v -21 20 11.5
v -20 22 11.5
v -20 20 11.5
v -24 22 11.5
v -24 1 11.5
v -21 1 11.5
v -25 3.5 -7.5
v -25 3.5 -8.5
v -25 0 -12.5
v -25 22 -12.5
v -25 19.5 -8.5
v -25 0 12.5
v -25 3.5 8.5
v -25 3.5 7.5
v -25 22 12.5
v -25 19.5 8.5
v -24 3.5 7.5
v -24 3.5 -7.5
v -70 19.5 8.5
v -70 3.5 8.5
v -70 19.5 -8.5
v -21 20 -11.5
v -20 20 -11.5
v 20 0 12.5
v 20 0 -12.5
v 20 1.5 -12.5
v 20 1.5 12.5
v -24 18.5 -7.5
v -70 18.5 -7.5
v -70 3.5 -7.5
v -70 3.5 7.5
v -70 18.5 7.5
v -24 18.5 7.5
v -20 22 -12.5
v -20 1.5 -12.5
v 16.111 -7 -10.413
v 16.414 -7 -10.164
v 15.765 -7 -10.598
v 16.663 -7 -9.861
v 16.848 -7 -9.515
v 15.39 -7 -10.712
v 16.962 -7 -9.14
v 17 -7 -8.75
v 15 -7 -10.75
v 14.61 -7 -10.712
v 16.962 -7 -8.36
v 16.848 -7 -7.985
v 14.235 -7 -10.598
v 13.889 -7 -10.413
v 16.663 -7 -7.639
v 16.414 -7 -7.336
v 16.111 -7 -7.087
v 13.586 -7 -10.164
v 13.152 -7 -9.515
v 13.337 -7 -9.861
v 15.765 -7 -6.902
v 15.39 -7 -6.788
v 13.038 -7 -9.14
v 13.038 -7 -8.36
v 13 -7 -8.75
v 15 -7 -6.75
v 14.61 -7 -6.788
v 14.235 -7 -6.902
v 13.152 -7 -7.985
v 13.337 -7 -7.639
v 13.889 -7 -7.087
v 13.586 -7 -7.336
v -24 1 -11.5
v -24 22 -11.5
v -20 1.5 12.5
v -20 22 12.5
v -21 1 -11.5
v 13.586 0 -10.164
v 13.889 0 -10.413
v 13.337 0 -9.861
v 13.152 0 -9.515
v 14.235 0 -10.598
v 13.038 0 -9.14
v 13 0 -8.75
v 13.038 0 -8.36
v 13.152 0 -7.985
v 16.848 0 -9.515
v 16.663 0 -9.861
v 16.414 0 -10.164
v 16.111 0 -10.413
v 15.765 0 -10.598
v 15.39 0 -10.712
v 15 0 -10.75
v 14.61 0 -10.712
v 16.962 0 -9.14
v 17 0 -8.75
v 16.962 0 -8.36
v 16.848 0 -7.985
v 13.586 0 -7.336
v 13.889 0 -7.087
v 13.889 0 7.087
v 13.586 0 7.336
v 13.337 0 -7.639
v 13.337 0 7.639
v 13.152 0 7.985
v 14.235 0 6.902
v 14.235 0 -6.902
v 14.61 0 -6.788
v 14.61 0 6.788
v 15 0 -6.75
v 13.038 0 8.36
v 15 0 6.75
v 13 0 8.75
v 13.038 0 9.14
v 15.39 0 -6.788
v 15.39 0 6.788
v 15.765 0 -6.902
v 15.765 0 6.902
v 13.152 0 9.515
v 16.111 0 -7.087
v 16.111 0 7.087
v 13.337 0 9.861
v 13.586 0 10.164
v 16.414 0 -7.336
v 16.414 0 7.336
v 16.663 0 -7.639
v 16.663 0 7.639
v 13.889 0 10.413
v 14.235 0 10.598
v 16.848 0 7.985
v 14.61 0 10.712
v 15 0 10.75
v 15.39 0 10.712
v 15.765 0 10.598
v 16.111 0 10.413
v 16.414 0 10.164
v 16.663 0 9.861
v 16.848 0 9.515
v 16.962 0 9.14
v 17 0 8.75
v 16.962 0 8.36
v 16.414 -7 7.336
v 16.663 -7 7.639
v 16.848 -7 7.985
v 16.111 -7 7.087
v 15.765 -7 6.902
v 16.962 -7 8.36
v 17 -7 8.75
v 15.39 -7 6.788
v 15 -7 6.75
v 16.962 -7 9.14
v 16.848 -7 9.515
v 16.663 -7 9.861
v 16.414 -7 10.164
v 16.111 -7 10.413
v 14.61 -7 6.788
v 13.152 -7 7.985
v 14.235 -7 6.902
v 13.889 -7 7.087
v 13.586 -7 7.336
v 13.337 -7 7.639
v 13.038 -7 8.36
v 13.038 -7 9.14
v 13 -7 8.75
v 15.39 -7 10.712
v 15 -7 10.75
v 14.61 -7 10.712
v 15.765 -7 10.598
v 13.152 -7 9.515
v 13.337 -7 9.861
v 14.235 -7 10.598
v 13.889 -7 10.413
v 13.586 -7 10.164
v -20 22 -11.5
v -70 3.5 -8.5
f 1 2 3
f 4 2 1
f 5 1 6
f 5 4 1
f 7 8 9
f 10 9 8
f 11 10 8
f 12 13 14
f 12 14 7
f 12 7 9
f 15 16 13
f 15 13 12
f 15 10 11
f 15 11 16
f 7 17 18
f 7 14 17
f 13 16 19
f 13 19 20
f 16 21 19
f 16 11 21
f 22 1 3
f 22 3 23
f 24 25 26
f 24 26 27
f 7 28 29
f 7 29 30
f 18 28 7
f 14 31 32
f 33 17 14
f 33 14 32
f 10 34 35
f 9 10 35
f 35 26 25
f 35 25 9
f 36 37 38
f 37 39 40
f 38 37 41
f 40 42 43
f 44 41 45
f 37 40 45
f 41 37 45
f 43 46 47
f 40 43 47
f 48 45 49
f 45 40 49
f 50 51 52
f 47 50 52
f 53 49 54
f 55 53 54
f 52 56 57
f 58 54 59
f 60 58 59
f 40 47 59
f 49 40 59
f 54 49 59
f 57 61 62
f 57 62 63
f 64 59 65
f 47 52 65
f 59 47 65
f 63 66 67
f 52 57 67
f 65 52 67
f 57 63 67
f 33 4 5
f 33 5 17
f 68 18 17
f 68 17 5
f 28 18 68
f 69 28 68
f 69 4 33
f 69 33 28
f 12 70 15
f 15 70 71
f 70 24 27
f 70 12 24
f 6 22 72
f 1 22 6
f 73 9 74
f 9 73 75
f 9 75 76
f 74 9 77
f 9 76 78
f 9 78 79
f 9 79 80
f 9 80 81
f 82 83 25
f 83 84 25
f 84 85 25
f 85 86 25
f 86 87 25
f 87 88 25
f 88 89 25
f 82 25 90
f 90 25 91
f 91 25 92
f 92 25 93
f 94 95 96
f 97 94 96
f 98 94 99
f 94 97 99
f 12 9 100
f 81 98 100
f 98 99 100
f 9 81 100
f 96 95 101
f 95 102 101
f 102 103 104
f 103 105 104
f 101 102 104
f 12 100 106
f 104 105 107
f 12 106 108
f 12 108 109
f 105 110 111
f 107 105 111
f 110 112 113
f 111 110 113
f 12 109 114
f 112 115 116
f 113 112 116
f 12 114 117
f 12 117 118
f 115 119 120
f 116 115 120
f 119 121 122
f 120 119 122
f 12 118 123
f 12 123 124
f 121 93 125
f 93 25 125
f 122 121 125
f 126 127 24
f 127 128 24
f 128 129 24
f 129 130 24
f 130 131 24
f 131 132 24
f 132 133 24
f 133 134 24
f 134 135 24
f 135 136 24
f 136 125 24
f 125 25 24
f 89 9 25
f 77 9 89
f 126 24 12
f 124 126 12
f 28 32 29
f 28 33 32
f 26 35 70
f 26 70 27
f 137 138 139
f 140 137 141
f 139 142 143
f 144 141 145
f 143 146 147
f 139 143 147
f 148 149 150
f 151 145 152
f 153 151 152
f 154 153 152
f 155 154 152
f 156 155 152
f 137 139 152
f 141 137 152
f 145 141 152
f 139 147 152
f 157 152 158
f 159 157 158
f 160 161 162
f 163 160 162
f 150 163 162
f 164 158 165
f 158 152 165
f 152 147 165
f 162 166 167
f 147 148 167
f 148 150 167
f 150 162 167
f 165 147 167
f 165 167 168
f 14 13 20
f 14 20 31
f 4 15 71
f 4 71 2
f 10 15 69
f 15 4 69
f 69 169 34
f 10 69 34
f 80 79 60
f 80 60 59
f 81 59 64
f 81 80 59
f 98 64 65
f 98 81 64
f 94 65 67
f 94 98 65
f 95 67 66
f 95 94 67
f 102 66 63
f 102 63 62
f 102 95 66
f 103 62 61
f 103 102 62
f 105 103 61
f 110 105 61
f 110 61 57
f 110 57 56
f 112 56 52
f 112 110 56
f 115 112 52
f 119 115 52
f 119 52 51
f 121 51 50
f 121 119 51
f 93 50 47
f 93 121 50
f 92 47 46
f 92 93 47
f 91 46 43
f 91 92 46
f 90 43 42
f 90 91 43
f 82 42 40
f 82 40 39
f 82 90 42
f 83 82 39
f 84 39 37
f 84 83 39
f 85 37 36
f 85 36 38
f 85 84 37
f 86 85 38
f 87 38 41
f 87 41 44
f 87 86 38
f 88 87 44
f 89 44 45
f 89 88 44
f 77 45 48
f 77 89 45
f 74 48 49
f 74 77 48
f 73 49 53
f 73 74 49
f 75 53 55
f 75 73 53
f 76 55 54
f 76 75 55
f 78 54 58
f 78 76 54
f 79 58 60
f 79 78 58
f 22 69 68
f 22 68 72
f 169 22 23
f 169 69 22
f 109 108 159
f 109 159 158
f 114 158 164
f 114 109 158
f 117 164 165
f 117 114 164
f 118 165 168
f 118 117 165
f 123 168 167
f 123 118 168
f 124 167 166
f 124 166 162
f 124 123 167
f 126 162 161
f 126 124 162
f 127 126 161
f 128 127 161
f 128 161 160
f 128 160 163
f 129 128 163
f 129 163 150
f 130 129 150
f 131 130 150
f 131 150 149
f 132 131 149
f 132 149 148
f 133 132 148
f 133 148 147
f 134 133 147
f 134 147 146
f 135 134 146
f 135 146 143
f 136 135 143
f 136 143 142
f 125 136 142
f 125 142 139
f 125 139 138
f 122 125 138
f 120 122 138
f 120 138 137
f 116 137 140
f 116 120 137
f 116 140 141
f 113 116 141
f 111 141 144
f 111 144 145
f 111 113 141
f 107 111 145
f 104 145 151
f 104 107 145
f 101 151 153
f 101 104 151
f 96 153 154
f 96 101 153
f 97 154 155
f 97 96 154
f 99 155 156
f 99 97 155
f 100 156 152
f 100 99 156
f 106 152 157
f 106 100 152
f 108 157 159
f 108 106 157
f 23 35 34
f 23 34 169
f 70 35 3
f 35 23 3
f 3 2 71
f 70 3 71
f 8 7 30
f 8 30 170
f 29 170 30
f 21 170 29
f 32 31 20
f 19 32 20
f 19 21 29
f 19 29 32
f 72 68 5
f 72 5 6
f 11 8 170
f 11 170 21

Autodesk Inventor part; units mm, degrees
ref_plane "YZ Plane" through (0, 0, 0) normal (1, 0, 0) x (0, 1, 0)
ref_plane "XZ Plane" through (0, 0, 0) normal (0, 1, 0) x (-1, 0, 0)
ref_plane "XY Plane" through (0, 0, 0) normal (0, 0, 1) x (1, 0, 0)
sketch "Sketch1" plane through (0, 0, 0) normal (0, 1, 0) x (-1, 0, 0)
  line L0 (-20, 12.5) -> (20, 12.5)
  line L1 (20, 12.5) -> (20, -12.5)
  line L2 (20, -12.5) -> (-20, -12.5)
  line L3 (-20, -12.5) -> (-20, 12.5)
  line L4 (-20, 12.5) -> (20, -12.5) construction
  line L5 (20, 12.5) -> (-20, -12.5) construction
  circle A0 centre (-15, 8.75) radius 2
  circle A1 centre (-15, -8.75) radius 2
  point P0 (0, 0)
  dimension "d0" = 40
  dimension "d1" = 25
  dimension "d2" = 4
  dimension "d3" = 4
extrude "Extrusion1" add sketch "Sketch1" along normal blind 1.5 contours L0 L1 L2 L3 | A1
extrude "Extrusion2" add sketch "Sketch1" against normal blind 7 contours A0 | A1
thread "Thread1" size "M4x0.7" class "6g" standard "ANSI Metric M Profile" full length
thread "Thread2" size "M4x0.7" class "6g" standard "ANSI Metric M Profile" full length
sketch "Sketch2" plane through (15, 0, 8.75) normal (0, 1, 0) x (1, 0, 0)
  circle A0 centre (0, 0) radius 2 projected
  circle A1 centre (0, 0) radius 2
  point P0 (-15, 8.75)
extrude "Extrusion3" add sketch "Sketch2" along normal blind 1.5
sketch "Sketch3" plane through (-20, 0, -12.5) normal (-1, 0, 0) x (0, 0, 1)
  line L0 (0, 0) -> (25, 0) projected
  line L1 (0, 0) -> (25, 0)
  line L2 (25, 0) -> (25, 22)
  line L3 (25, 22) -> (0, 22)
  line L4 (0, 22) -> (0, 0)
  point P0 (12.5, 0)
  dimension "d14" = 22
extrude "Extrusion4" add sketch "Sketch3" along normal blind 5
sketch "Sketch4" plane through (-20, 22, 12.5) normal (0, 1, 0) x (1, 0, 0)
  line L0 (-4, 24) -> (-1, 24)
  line L1 (-1, 24) -> (-1, 1)
  line L2 (-1, 1) -> (-4, 1)
  line L3 (-4, 1) -> (-4, 24)
  point P0 (20, 12.5)
  dimension "d17" = 3
  dimension "d18" = 23
extrude "Extrusion5" cut sketch "Sketch4" against normal blind 21
sketch "Sketch5" plane through (-25, 0, -12.5) normal (-1, 0, 0) x (0, 0, 1)
  line L0 (20, 18.5) -> (20, 3.5)
  line L1 (20, 3.5) -> (5, 3.5)
  line L2 (5, 3.5) -> (5, 18.5)
  line L3 (5, 18.5) -> (20, 18.5)
  point P0 (12.5, 0)
  dimension "d21" = 15
  dimension "d22" = 15
extrude "Extrusion6" cut sketch "Sketch5" against normal blind 1
sketch "Sketch6" plane through (-21, 22, -11.5) normal (-1, 0, 0) x (0, 0, 1)
  line L0 (0, 0) -> (23, 0) projected
  line L1 (0, 0) -> (23, 0)
  line L2 (23, 0) -> (23, -2)
  line L3 (23, -2) -> (0, -2)
  line L4 (0, -2) -> (0, 0)
  point P0 (11.5, -22)
  dimension "d26" = 2
extrude "Extrusion7" cut sketch "Sketch6" against normal blind 1
sketch "Sketch7" plane through (-25, 0, -12.5) normal (-1, 0, 0) x (0, 0, 1)
  line L0 (20, 3.5) -> (5, 3.5) projected
  line L1 (5, 3.5) -> (4, 3.5)
  line L2 (4, 3.5) -> (4, 19.5)
  line L3 (4, 19.5) -> (5, 19.5)
  line L4 (5, 19.5) -> (5, 3.5)
  line L5 (5, 19.5) -> (20, 19.5)
  line L6 (20, 19.5) -> (20, 18.5)
  line L7 (20, 18.5) -> (5, 18.5)
  line L8 (5, 18.5) -> (5, 19.5)
  line L9 (20, 3.5) -> (20, 19.5)
  line L10 (20, 19.5) -> (21, 19.5)
  line L11 (21, 19.5) -> (21, 3.5)
  line L12 (21, 3.5) -> (20, 3.5)
  line L13 (25, 0) -> (25, 22) projected
  point P0 (12.5, 0)
  dimension "d29" = 1
  dimension "d30" = 16
  dimension "d31" = 15
  dimension "d32" = 1
extrude "Extrusion8" add sketch "Sketch7" along normal blind 1 contours L1 L2 L3 L4
extrude "Extrusion9" add sketch "Sketch7" along normal blind 45 contours L9 L6 L10 L11 L12 | L7 L4 L5 L6
extrude "Extrusion10" add sketch "Sketch7" along normal blind 45 contours L1 L2 L3 L4
properties part number "rgb-holder-group2"
